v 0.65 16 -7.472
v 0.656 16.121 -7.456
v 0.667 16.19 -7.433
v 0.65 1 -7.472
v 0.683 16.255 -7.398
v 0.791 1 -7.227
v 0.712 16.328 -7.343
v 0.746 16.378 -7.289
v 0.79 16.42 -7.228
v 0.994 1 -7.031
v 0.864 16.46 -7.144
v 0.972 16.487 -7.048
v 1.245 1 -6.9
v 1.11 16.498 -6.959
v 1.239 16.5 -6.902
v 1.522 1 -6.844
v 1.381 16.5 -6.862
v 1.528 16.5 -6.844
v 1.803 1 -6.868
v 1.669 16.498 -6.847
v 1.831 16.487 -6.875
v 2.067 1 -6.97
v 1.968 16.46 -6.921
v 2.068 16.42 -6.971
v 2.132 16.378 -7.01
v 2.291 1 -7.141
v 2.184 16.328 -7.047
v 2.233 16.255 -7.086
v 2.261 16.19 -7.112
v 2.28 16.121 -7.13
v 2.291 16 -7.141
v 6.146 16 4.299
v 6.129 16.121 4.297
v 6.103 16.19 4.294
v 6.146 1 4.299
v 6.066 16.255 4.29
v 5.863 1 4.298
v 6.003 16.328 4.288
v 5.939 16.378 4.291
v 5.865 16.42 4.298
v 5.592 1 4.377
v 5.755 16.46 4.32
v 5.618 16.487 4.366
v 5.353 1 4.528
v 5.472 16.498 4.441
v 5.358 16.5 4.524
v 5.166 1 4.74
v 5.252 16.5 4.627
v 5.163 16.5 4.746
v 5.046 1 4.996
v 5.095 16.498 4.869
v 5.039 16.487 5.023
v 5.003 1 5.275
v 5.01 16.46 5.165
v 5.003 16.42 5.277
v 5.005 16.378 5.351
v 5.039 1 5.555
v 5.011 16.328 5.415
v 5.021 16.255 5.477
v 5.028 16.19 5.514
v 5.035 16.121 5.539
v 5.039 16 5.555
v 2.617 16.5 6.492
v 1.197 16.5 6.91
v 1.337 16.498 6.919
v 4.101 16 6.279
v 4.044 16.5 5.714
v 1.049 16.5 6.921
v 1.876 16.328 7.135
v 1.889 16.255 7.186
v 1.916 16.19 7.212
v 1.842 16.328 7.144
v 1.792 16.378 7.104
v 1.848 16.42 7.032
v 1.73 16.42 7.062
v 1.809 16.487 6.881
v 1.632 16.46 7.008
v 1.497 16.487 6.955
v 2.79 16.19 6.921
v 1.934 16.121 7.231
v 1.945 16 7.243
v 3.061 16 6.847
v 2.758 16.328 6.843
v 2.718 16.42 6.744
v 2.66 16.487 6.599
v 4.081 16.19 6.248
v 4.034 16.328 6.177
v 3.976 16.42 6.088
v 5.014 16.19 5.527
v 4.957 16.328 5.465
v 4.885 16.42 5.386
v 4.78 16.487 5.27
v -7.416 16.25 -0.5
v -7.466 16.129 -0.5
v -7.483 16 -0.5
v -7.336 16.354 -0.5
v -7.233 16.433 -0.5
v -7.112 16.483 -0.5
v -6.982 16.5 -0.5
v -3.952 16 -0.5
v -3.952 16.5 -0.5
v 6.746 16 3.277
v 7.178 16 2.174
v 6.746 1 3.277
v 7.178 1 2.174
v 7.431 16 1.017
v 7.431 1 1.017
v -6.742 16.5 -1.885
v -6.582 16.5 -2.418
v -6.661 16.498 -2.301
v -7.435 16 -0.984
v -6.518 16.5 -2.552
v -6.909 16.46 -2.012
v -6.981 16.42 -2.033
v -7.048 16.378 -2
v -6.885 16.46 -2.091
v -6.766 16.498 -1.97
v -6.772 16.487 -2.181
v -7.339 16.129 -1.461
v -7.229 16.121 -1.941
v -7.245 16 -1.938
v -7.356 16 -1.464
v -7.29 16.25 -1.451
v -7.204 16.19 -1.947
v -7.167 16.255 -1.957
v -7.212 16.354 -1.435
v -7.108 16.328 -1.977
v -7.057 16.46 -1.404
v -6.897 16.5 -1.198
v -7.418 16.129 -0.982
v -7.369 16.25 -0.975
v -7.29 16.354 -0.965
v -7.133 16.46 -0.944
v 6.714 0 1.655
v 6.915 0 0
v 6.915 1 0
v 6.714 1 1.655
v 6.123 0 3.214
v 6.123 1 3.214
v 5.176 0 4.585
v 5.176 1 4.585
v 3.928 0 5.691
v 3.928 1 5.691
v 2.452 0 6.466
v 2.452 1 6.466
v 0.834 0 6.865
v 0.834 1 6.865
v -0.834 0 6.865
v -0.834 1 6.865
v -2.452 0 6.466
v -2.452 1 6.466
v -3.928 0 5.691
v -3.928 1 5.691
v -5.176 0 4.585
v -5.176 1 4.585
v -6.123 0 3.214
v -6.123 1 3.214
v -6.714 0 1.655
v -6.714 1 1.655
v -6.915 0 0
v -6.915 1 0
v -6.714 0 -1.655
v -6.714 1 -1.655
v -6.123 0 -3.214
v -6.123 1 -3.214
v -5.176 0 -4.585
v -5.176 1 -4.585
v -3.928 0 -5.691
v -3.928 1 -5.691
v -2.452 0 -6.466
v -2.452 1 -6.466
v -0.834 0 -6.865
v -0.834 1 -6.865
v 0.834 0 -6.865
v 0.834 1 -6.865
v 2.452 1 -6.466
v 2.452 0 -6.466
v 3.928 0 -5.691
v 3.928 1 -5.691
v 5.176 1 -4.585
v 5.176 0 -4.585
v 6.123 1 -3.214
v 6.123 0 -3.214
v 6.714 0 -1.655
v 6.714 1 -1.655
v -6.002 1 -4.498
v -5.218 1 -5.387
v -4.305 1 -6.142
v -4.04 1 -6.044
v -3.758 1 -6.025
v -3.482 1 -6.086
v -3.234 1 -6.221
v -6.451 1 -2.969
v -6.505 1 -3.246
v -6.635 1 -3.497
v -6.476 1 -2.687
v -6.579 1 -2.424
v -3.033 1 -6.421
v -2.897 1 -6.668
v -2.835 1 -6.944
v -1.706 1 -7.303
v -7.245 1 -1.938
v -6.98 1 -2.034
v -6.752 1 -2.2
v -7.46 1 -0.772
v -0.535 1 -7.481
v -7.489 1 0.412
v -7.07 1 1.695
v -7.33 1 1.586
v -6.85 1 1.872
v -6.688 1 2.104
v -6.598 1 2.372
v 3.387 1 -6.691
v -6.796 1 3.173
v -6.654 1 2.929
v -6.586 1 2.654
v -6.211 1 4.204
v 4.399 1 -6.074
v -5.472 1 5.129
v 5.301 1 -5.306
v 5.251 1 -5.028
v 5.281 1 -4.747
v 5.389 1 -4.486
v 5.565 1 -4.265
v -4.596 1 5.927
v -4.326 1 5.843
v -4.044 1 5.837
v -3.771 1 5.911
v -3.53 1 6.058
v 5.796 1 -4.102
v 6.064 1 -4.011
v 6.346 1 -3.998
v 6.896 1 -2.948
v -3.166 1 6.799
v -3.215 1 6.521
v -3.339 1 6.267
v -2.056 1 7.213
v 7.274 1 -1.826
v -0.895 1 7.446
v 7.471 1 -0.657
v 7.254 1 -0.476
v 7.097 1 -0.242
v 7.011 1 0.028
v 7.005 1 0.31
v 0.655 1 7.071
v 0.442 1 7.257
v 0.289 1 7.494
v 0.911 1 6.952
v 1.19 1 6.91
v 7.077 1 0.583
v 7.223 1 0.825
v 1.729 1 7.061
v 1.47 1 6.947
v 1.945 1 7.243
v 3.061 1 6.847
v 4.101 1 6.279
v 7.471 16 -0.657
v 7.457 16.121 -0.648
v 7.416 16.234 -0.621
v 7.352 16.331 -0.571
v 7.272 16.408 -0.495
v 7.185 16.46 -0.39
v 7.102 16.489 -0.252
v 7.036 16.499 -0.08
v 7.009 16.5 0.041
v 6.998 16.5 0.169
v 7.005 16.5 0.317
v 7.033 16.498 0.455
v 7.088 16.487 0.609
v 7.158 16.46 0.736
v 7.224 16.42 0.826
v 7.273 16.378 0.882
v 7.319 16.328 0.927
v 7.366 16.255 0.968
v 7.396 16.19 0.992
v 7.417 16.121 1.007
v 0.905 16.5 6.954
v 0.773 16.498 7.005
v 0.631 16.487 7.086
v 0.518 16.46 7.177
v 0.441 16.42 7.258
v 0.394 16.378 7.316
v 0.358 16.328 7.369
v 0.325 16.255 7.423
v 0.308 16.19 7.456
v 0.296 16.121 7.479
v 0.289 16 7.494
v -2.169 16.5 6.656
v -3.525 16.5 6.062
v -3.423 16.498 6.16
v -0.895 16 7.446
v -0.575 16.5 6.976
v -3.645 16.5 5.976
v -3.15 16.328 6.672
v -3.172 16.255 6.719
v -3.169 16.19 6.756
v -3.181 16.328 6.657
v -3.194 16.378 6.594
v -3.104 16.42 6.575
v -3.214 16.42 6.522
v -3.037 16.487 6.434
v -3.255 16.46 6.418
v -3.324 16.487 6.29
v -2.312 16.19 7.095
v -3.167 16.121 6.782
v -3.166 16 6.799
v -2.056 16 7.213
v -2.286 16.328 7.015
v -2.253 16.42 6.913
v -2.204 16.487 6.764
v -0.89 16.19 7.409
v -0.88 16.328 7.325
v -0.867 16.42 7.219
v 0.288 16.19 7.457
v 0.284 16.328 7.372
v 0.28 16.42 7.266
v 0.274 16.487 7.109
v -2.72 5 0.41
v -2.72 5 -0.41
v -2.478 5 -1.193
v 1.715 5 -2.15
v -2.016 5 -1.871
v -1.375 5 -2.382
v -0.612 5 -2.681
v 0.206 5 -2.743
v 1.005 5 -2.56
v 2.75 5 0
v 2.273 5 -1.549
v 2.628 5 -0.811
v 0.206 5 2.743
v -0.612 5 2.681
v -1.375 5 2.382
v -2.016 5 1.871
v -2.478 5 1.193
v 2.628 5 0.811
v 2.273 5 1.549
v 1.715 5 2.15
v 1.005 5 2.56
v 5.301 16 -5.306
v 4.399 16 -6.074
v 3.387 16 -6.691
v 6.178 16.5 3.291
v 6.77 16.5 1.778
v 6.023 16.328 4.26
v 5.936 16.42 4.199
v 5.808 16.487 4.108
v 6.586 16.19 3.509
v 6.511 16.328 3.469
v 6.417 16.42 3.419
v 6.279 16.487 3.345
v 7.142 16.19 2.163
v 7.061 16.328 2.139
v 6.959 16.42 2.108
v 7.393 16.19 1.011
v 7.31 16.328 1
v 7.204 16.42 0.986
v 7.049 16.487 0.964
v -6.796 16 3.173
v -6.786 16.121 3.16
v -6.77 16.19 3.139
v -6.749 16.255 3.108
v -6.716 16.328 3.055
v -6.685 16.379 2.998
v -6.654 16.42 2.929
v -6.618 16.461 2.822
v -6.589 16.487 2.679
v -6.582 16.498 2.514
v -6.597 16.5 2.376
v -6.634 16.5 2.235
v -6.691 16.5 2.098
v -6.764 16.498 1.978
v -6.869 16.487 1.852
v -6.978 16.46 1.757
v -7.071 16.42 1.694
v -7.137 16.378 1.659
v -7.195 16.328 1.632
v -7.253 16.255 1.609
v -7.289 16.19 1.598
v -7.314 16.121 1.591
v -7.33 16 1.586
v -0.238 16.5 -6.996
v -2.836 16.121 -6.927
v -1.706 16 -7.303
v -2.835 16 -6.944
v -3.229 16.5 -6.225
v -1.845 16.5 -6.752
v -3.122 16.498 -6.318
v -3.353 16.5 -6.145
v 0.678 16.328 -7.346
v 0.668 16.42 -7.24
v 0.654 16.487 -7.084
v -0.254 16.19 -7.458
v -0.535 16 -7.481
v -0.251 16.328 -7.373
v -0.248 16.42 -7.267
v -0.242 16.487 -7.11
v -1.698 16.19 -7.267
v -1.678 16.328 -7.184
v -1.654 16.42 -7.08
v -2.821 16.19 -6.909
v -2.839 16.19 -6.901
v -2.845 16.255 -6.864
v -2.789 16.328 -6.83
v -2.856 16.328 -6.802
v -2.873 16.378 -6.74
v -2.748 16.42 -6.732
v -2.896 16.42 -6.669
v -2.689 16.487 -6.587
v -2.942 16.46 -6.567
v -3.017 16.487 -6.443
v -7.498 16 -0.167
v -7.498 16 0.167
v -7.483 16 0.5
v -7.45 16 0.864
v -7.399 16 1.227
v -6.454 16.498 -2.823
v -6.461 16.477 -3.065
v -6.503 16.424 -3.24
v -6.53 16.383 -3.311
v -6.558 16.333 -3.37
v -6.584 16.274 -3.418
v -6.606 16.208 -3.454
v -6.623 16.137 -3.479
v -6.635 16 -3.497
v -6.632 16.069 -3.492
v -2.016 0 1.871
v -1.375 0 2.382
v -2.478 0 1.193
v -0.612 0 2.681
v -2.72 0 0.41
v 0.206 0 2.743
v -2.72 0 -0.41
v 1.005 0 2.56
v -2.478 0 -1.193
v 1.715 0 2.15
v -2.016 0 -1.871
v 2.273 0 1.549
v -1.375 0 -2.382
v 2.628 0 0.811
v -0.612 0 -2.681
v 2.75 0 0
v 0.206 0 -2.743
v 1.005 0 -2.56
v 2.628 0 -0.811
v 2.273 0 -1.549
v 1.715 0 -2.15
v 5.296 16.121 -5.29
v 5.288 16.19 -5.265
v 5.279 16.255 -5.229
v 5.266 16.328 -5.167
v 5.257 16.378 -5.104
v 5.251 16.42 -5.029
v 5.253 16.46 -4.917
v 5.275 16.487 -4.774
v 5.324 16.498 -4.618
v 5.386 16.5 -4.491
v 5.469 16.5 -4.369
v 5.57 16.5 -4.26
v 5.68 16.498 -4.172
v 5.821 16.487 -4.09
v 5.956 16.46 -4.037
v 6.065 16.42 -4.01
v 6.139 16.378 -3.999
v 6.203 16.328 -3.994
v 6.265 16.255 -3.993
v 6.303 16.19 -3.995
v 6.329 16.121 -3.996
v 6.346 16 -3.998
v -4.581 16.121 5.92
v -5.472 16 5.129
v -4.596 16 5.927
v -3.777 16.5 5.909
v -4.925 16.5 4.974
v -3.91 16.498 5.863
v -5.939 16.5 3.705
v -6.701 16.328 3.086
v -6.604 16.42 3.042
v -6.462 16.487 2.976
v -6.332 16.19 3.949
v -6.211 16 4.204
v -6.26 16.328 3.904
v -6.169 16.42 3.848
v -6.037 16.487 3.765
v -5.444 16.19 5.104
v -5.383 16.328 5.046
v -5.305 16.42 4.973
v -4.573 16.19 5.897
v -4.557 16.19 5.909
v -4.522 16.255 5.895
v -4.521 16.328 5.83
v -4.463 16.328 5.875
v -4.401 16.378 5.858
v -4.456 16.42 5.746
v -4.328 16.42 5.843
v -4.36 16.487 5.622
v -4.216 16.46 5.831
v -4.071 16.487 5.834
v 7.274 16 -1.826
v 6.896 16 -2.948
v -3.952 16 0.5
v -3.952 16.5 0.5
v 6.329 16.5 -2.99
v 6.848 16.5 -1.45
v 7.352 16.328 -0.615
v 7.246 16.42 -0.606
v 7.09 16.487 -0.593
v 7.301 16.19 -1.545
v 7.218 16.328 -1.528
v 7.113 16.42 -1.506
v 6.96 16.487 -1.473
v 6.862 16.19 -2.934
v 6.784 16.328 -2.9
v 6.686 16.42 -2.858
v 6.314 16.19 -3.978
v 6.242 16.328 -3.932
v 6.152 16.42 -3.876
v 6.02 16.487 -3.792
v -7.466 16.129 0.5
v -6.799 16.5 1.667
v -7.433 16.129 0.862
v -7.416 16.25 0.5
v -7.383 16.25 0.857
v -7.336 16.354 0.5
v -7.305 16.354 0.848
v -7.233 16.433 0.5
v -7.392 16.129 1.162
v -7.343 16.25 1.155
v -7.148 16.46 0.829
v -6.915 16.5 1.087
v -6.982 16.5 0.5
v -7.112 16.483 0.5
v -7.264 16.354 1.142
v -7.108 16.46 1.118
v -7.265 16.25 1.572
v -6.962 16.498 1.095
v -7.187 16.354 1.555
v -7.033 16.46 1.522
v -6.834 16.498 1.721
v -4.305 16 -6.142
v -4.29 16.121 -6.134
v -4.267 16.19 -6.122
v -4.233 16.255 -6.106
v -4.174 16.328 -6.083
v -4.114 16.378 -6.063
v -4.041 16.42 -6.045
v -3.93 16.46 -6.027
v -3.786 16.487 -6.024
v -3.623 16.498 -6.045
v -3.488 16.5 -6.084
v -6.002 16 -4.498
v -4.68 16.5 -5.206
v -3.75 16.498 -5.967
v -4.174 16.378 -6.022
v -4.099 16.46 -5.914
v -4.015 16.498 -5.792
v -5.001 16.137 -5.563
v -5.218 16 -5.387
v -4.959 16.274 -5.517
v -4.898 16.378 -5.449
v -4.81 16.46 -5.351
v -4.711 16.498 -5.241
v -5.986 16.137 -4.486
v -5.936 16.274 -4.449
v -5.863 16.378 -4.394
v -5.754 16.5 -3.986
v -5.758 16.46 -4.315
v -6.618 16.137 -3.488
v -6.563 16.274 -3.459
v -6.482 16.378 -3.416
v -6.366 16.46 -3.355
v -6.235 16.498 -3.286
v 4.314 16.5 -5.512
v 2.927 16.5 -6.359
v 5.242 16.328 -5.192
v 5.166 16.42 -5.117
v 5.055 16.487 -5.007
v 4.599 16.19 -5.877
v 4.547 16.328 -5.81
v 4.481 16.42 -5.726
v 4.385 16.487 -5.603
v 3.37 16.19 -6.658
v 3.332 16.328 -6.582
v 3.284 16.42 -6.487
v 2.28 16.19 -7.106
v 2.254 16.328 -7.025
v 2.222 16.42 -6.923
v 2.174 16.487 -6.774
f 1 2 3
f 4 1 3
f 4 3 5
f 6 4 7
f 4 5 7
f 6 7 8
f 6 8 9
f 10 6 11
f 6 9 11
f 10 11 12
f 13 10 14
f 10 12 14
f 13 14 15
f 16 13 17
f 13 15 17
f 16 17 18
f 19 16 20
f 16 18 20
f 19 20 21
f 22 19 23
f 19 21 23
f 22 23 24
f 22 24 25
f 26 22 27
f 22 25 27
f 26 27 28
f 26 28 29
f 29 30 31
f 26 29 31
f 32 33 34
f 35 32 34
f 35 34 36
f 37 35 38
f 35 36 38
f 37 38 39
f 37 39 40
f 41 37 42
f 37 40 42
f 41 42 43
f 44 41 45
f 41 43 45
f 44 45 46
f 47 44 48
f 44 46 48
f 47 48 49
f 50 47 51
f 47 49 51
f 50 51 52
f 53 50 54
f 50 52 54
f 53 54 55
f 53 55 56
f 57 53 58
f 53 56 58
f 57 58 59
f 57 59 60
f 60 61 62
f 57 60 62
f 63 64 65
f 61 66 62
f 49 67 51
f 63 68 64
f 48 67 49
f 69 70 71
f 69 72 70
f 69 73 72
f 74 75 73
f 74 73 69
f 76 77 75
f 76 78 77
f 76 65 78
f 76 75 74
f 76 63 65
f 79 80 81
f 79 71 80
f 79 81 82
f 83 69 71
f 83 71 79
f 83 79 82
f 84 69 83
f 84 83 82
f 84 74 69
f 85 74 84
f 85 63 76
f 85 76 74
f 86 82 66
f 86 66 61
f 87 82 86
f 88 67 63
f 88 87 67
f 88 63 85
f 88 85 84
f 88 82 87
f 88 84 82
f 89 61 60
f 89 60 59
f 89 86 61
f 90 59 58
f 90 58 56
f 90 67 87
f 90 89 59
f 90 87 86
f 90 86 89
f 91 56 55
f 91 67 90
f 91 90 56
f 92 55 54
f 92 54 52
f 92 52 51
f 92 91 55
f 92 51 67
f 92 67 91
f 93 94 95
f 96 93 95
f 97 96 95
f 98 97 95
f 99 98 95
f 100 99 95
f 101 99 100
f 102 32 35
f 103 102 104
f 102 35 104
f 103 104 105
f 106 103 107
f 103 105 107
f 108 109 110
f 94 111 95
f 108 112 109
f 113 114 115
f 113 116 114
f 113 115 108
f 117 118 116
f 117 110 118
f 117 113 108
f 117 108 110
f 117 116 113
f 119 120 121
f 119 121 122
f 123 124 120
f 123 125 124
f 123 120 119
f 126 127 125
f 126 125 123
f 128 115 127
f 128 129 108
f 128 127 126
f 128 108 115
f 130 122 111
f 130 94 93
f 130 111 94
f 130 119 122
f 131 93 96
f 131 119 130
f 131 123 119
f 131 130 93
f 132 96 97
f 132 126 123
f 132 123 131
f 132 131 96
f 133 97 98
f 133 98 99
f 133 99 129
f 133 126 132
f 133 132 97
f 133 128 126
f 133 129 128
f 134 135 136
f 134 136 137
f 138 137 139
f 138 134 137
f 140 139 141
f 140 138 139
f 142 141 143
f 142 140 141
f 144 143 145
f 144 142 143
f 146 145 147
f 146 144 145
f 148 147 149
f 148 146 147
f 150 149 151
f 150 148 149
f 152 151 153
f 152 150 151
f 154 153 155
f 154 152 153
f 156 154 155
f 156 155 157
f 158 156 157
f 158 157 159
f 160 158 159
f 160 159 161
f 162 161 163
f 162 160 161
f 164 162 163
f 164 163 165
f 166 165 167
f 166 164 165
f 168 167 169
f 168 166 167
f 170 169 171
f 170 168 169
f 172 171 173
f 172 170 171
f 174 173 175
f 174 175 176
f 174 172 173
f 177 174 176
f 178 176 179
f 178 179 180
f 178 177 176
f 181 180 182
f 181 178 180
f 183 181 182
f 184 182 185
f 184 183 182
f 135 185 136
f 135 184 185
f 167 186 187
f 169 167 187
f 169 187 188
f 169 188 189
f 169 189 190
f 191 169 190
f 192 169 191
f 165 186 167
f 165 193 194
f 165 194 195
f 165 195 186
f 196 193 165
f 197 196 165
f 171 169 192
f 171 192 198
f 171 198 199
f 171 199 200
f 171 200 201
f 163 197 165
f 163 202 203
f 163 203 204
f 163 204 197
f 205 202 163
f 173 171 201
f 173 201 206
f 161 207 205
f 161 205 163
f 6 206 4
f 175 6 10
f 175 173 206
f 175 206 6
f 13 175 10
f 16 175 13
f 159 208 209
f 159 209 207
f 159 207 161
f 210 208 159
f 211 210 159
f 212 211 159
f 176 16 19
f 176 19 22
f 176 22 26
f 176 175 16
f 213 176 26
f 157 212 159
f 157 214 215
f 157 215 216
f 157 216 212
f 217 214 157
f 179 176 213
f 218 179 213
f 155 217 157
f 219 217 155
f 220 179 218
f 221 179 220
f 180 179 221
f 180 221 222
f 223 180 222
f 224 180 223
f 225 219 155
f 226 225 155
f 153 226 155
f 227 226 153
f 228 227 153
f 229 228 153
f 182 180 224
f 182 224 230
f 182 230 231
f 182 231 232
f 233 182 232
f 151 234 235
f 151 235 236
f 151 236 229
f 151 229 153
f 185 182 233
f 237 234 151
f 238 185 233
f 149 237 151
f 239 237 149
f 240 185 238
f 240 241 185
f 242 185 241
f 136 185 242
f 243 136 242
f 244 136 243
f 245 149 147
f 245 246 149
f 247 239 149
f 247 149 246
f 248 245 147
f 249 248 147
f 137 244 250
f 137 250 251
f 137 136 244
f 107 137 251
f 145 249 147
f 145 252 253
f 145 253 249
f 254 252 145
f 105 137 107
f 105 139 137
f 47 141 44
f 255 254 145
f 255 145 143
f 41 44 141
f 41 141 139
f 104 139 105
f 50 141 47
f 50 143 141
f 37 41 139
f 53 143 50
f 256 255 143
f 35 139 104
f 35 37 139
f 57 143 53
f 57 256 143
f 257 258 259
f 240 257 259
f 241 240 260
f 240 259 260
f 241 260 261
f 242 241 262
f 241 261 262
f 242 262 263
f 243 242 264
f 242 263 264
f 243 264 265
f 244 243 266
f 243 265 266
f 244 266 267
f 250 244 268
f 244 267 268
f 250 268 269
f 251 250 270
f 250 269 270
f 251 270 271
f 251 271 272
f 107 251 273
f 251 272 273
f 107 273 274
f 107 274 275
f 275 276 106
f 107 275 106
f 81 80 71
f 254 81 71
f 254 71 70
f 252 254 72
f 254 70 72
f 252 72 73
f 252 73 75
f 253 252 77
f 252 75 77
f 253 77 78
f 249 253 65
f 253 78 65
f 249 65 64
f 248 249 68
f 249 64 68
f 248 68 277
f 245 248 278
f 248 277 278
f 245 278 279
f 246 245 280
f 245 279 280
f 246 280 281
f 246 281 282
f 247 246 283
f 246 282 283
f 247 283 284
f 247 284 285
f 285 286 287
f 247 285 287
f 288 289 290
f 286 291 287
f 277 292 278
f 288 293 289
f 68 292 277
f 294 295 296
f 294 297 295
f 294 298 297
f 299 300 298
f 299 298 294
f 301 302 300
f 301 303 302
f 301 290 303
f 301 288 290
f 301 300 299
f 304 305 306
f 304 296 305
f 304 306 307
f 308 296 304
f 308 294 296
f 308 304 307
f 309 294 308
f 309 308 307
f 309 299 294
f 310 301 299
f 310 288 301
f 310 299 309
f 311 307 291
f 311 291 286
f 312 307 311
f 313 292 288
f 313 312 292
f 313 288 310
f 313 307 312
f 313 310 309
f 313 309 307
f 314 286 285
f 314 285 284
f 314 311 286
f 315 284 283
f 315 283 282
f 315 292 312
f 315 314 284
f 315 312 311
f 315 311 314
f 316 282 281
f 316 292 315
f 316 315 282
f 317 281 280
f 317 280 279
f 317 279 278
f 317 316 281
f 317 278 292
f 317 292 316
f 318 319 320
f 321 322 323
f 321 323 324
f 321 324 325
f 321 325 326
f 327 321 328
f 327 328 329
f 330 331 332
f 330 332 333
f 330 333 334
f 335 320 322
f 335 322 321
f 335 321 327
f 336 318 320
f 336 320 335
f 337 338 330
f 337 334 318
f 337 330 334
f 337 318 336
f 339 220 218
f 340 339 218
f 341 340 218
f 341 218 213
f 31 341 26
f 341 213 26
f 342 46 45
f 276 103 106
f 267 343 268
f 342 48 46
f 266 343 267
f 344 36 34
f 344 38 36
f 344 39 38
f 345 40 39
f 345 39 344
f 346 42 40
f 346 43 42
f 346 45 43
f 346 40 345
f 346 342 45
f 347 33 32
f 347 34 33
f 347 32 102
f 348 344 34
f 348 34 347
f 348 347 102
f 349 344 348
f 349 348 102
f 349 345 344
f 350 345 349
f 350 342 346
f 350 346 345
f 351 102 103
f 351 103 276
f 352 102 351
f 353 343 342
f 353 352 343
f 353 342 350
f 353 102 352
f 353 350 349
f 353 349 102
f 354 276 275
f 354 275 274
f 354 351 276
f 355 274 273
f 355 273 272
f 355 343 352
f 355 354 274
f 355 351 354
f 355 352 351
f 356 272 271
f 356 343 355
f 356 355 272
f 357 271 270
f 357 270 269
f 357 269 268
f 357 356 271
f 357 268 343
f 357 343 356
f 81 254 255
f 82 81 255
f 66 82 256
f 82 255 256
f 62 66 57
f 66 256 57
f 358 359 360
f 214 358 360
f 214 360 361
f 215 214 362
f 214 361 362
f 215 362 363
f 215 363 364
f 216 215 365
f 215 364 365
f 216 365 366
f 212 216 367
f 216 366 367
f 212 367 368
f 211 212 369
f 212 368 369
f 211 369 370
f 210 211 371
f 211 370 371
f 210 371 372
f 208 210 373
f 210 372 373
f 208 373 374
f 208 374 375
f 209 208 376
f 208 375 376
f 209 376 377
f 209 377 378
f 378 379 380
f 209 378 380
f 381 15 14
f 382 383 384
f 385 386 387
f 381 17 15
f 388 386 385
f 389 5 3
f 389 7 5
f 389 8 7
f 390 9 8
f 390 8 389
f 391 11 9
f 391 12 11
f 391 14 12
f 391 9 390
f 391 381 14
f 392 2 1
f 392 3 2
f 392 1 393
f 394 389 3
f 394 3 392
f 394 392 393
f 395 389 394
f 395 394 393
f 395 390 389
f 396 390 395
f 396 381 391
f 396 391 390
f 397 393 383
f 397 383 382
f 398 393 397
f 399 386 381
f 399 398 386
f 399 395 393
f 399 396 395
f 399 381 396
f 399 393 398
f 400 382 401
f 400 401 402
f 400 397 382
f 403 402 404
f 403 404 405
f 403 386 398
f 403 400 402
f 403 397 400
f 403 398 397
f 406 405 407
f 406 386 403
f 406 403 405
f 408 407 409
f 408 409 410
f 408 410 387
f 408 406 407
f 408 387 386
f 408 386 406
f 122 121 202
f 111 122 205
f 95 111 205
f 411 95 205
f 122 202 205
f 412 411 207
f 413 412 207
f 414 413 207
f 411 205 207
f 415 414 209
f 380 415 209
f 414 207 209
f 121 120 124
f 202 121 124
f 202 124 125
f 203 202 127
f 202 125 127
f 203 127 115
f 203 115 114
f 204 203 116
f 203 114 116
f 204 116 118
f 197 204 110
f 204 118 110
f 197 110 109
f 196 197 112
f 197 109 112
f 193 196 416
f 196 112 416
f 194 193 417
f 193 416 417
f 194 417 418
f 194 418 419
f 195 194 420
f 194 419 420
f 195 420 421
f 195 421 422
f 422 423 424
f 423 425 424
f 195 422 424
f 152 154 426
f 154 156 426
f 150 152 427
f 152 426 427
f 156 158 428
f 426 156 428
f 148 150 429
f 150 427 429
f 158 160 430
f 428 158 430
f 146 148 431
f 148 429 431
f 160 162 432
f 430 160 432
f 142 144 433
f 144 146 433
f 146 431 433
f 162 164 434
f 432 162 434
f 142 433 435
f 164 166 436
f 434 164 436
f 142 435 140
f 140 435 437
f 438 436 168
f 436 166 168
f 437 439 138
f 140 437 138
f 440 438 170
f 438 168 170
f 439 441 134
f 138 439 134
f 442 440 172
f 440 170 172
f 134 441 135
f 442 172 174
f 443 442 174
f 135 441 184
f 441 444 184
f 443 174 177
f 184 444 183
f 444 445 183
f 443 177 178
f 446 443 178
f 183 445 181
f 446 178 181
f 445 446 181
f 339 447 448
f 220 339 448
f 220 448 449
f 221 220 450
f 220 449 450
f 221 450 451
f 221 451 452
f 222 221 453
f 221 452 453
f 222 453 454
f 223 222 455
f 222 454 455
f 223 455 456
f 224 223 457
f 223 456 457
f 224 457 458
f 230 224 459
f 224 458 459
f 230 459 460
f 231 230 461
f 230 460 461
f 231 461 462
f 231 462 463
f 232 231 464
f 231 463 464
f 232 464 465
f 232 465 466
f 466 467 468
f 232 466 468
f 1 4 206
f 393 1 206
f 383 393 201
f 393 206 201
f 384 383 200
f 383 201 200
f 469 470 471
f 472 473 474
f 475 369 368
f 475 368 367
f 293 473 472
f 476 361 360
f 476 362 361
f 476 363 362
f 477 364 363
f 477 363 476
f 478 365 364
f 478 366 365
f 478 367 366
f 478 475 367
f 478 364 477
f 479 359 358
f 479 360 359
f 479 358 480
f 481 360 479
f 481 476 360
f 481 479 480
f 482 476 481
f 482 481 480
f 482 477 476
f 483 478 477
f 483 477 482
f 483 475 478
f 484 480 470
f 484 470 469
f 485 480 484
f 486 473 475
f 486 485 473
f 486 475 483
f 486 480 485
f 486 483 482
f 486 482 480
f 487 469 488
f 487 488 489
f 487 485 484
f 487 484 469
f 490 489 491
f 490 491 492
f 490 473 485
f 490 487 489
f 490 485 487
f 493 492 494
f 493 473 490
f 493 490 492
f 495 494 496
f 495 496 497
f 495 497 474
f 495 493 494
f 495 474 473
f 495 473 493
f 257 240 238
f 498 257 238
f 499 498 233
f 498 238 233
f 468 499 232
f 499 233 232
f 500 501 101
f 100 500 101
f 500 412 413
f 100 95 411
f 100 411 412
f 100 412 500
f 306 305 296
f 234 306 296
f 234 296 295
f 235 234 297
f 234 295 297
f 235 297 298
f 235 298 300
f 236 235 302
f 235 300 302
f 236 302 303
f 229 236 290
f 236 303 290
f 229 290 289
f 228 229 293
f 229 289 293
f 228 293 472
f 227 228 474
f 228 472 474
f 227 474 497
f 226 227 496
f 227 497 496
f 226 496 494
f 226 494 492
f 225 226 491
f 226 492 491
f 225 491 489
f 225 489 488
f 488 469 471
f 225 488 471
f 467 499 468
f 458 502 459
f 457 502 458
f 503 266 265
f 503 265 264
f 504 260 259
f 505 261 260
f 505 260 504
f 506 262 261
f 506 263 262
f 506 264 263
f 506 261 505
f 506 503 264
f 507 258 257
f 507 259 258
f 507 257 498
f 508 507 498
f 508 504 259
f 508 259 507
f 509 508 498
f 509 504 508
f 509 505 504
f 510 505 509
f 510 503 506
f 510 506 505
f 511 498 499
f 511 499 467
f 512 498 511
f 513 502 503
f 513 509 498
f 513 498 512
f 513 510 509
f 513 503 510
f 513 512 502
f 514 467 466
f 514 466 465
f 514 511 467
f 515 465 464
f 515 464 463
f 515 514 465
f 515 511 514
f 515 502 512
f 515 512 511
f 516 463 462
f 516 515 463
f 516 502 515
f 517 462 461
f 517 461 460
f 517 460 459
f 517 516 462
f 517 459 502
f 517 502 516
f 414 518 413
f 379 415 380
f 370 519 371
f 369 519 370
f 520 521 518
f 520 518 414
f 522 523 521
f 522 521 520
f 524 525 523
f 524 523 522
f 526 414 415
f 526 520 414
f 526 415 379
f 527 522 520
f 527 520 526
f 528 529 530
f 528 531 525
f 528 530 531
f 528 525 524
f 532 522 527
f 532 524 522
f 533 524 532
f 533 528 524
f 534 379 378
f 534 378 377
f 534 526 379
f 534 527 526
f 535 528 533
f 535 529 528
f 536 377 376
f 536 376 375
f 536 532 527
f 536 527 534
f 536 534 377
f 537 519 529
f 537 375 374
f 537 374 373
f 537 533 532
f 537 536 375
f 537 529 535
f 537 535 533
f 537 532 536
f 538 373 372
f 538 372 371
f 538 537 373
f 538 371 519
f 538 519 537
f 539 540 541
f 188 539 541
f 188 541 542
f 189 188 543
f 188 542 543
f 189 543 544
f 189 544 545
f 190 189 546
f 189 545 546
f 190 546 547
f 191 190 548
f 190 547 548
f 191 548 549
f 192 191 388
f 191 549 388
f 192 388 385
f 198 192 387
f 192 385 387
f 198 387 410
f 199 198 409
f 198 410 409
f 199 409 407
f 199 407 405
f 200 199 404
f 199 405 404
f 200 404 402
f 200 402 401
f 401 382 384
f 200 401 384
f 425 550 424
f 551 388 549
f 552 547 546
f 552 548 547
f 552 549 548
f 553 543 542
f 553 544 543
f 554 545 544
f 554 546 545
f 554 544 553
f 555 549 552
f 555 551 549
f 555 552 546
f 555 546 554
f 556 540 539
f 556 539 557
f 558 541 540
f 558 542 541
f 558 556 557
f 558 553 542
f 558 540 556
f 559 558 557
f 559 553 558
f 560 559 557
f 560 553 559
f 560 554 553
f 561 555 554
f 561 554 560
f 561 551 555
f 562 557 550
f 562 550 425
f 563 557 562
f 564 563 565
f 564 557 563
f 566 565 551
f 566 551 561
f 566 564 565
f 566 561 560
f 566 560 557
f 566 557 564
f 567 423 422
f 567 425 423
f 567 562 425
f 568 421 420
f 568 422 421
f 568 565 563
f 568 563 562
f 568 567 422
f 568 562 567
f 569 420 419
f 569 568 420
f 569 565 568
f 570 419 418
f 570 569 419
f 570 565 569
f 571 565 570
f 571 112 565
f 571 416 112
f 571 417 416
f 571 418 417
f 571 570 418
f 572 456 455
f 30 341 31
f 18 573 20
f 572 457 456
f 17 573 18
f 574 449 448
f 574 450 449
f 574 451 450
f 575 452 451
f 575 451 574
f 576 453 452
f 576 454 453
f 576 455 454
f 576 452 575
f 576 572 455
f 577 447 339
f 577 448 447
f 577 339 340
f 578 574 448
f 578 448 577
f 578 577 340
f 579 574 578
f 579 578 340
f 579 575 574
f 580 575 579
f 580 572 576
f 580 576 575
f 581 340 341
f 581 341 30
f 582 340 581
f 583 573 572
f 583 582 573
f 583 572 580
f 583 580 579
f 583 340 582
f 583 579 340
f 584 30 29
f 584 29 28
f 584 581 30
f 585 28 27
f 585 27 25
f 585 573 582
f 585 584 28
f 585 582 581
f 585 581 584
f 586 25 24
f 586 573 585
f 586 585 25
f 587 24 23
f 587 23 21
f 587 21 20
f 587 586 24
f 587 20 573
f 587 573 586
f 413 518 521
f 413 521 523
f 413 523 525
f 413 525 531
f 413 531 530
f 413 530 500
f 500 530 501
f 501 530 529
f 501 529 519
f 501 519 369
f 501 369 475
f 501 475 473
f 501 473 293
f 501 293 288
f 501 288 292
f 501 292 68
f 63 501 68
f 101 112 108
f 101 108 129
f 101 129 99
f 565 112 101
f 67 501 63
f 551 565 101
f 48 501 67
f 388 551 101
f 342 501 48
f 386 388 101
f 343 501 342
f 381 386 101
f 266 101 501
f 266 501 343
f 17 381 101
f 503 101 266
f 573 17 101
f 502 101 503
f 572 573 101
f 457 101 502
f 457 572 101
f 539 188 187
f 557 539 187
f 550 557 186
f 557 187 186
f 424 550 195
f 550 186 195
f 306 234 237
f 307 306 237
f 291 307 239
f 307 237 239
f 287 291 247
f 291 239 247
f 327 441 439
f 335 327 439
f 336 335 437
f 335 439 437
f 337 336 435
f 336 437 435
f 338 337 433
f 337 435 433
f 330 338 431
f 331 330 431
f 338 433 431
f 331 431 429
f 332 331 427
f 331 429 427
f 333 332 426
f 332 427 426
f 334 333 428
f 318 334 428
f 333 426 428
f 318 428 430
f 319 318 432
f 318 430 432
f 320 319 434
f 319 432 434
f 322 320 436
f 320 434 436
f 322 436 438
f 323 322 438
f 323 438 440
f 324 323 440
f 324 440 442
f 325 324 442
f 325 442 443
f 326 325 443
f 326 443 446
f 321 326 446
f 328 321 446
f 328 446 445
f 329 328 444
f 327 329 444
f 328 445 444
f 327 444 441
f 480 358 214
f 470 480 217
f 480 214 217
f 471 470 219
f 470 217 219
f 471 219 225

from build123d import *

# Parameters (mm, degrees)
SKETCH1_R           = 7.5
BOSS_EXTRUDE1_DEPTH = 16.5
FILLET1_R           = 0.5
SKETCH2_R           = 2.750419987
CUT_EXTRUDE1_DEPTH  = 5
SKETCH3_R           = 7.5
SKETCH3_R_2         = 6.914968151
CUT_EXTRUDE2_DEPTH  = 1
SKETCH4_R           = 1
CUT_EXTRUDE3_DEPTH  = 17.5
SKETCH5_W           = 3.999641176
SKETCH5_H           = 1
CUT_EXTRUDE4_DEPTH  = 0.5


with BuildPart() as part:
    # Sketch1 → Boss-Extrude1 (new body)
    with BuildSketch(Plane(origin=(0, 0, 0), x_dir=(1, 0, 0), z_dir=(0, 1, 0))):
        Circle(SKETCH1_R)
    extrude(amount=BOSS_EXTRUDE1_DEPTH)

    # Fillet1
    fillet1_edges = [part.edges().sort_by_distance(p)[0] for p in [
        (-7.5, 16.5, 0),
    ]]
    fillet(fillet1_edges, radius=FILLET1_R)

    # Sketch2 → Cut-Extrude1 (cut)
    with BuildSketch(Plane.XZ):
        Circle(SKETCH2_R)
    extrude(amount=-CUT_EXTRUDE1_DEPTH, mode=Mode.SUBTRACT)

    # Sketch3 → Cut-Extrude2 (cut)
    with BuildSketch(Plane.XZ):
        Circle(SKETCH3_R)
        Circle(SKETCH3_R_2, mode=Mode.SUBTRACT)
    extrude(amount=-CUT_EXTRUDE2_DEPTH, mode=Mode.SUBTRACT)

    # Sketch4 → Cut-Extrude3 (cut, through all)
    with BuildSketch(Plane(origin=(0, 16.5, 0), x_dir=(1, 0, 0), z_dir=(0, 1, 0))):
        with Locations((1.198920421, -7.909651688)):
            Circle(SKETCH4_R)
        with Locations((-4.165799776, -6.829795914)):
            Circle(SKETCH4_R)
        with Locations((-7.58129596, -2.554202727)):
            Circle(SKETCH4_R)
        with Locations((-7.449419507, 2.916530302)):
            Circle(SKETCH4_R)
        with Locations((-3.831876876, 7.02258639)):
            Circle(SKETCH4_R)
        with Locations((1.578643531, 7.842696258)):
            Circle(SKETCH4_R)
        with Locations((6.250499086, 4.993121386)):
            Circle(SKETCH4_R)
        with Locations((7.997676652, -0.192790476)):
            Circle(SKETCH4_R)
        with Locations((6.002652428, -5.288493531)):
            Circle(SKETCH4_R)
    extrude(amount=-CUT_EXTRUDE3_DEPTH, mode=Mode.SUBTRACT)

    # Sketch5 → Cut-Extrude4 (cut)
    with BuildSketch(Plane(origin=(0, 16.5, 0), x_dir=(1, 0, 0), z_dir=(0, 1, 0))):
        with Locations((-5.951382342, 0)):
            Rectangle(SKETCH5_W, SKETCH5_H)
    extrude(amount=-CUT_EXTRUDE4_DEPTH, mode=Mode.SUBTRACT)


solid = part.part
